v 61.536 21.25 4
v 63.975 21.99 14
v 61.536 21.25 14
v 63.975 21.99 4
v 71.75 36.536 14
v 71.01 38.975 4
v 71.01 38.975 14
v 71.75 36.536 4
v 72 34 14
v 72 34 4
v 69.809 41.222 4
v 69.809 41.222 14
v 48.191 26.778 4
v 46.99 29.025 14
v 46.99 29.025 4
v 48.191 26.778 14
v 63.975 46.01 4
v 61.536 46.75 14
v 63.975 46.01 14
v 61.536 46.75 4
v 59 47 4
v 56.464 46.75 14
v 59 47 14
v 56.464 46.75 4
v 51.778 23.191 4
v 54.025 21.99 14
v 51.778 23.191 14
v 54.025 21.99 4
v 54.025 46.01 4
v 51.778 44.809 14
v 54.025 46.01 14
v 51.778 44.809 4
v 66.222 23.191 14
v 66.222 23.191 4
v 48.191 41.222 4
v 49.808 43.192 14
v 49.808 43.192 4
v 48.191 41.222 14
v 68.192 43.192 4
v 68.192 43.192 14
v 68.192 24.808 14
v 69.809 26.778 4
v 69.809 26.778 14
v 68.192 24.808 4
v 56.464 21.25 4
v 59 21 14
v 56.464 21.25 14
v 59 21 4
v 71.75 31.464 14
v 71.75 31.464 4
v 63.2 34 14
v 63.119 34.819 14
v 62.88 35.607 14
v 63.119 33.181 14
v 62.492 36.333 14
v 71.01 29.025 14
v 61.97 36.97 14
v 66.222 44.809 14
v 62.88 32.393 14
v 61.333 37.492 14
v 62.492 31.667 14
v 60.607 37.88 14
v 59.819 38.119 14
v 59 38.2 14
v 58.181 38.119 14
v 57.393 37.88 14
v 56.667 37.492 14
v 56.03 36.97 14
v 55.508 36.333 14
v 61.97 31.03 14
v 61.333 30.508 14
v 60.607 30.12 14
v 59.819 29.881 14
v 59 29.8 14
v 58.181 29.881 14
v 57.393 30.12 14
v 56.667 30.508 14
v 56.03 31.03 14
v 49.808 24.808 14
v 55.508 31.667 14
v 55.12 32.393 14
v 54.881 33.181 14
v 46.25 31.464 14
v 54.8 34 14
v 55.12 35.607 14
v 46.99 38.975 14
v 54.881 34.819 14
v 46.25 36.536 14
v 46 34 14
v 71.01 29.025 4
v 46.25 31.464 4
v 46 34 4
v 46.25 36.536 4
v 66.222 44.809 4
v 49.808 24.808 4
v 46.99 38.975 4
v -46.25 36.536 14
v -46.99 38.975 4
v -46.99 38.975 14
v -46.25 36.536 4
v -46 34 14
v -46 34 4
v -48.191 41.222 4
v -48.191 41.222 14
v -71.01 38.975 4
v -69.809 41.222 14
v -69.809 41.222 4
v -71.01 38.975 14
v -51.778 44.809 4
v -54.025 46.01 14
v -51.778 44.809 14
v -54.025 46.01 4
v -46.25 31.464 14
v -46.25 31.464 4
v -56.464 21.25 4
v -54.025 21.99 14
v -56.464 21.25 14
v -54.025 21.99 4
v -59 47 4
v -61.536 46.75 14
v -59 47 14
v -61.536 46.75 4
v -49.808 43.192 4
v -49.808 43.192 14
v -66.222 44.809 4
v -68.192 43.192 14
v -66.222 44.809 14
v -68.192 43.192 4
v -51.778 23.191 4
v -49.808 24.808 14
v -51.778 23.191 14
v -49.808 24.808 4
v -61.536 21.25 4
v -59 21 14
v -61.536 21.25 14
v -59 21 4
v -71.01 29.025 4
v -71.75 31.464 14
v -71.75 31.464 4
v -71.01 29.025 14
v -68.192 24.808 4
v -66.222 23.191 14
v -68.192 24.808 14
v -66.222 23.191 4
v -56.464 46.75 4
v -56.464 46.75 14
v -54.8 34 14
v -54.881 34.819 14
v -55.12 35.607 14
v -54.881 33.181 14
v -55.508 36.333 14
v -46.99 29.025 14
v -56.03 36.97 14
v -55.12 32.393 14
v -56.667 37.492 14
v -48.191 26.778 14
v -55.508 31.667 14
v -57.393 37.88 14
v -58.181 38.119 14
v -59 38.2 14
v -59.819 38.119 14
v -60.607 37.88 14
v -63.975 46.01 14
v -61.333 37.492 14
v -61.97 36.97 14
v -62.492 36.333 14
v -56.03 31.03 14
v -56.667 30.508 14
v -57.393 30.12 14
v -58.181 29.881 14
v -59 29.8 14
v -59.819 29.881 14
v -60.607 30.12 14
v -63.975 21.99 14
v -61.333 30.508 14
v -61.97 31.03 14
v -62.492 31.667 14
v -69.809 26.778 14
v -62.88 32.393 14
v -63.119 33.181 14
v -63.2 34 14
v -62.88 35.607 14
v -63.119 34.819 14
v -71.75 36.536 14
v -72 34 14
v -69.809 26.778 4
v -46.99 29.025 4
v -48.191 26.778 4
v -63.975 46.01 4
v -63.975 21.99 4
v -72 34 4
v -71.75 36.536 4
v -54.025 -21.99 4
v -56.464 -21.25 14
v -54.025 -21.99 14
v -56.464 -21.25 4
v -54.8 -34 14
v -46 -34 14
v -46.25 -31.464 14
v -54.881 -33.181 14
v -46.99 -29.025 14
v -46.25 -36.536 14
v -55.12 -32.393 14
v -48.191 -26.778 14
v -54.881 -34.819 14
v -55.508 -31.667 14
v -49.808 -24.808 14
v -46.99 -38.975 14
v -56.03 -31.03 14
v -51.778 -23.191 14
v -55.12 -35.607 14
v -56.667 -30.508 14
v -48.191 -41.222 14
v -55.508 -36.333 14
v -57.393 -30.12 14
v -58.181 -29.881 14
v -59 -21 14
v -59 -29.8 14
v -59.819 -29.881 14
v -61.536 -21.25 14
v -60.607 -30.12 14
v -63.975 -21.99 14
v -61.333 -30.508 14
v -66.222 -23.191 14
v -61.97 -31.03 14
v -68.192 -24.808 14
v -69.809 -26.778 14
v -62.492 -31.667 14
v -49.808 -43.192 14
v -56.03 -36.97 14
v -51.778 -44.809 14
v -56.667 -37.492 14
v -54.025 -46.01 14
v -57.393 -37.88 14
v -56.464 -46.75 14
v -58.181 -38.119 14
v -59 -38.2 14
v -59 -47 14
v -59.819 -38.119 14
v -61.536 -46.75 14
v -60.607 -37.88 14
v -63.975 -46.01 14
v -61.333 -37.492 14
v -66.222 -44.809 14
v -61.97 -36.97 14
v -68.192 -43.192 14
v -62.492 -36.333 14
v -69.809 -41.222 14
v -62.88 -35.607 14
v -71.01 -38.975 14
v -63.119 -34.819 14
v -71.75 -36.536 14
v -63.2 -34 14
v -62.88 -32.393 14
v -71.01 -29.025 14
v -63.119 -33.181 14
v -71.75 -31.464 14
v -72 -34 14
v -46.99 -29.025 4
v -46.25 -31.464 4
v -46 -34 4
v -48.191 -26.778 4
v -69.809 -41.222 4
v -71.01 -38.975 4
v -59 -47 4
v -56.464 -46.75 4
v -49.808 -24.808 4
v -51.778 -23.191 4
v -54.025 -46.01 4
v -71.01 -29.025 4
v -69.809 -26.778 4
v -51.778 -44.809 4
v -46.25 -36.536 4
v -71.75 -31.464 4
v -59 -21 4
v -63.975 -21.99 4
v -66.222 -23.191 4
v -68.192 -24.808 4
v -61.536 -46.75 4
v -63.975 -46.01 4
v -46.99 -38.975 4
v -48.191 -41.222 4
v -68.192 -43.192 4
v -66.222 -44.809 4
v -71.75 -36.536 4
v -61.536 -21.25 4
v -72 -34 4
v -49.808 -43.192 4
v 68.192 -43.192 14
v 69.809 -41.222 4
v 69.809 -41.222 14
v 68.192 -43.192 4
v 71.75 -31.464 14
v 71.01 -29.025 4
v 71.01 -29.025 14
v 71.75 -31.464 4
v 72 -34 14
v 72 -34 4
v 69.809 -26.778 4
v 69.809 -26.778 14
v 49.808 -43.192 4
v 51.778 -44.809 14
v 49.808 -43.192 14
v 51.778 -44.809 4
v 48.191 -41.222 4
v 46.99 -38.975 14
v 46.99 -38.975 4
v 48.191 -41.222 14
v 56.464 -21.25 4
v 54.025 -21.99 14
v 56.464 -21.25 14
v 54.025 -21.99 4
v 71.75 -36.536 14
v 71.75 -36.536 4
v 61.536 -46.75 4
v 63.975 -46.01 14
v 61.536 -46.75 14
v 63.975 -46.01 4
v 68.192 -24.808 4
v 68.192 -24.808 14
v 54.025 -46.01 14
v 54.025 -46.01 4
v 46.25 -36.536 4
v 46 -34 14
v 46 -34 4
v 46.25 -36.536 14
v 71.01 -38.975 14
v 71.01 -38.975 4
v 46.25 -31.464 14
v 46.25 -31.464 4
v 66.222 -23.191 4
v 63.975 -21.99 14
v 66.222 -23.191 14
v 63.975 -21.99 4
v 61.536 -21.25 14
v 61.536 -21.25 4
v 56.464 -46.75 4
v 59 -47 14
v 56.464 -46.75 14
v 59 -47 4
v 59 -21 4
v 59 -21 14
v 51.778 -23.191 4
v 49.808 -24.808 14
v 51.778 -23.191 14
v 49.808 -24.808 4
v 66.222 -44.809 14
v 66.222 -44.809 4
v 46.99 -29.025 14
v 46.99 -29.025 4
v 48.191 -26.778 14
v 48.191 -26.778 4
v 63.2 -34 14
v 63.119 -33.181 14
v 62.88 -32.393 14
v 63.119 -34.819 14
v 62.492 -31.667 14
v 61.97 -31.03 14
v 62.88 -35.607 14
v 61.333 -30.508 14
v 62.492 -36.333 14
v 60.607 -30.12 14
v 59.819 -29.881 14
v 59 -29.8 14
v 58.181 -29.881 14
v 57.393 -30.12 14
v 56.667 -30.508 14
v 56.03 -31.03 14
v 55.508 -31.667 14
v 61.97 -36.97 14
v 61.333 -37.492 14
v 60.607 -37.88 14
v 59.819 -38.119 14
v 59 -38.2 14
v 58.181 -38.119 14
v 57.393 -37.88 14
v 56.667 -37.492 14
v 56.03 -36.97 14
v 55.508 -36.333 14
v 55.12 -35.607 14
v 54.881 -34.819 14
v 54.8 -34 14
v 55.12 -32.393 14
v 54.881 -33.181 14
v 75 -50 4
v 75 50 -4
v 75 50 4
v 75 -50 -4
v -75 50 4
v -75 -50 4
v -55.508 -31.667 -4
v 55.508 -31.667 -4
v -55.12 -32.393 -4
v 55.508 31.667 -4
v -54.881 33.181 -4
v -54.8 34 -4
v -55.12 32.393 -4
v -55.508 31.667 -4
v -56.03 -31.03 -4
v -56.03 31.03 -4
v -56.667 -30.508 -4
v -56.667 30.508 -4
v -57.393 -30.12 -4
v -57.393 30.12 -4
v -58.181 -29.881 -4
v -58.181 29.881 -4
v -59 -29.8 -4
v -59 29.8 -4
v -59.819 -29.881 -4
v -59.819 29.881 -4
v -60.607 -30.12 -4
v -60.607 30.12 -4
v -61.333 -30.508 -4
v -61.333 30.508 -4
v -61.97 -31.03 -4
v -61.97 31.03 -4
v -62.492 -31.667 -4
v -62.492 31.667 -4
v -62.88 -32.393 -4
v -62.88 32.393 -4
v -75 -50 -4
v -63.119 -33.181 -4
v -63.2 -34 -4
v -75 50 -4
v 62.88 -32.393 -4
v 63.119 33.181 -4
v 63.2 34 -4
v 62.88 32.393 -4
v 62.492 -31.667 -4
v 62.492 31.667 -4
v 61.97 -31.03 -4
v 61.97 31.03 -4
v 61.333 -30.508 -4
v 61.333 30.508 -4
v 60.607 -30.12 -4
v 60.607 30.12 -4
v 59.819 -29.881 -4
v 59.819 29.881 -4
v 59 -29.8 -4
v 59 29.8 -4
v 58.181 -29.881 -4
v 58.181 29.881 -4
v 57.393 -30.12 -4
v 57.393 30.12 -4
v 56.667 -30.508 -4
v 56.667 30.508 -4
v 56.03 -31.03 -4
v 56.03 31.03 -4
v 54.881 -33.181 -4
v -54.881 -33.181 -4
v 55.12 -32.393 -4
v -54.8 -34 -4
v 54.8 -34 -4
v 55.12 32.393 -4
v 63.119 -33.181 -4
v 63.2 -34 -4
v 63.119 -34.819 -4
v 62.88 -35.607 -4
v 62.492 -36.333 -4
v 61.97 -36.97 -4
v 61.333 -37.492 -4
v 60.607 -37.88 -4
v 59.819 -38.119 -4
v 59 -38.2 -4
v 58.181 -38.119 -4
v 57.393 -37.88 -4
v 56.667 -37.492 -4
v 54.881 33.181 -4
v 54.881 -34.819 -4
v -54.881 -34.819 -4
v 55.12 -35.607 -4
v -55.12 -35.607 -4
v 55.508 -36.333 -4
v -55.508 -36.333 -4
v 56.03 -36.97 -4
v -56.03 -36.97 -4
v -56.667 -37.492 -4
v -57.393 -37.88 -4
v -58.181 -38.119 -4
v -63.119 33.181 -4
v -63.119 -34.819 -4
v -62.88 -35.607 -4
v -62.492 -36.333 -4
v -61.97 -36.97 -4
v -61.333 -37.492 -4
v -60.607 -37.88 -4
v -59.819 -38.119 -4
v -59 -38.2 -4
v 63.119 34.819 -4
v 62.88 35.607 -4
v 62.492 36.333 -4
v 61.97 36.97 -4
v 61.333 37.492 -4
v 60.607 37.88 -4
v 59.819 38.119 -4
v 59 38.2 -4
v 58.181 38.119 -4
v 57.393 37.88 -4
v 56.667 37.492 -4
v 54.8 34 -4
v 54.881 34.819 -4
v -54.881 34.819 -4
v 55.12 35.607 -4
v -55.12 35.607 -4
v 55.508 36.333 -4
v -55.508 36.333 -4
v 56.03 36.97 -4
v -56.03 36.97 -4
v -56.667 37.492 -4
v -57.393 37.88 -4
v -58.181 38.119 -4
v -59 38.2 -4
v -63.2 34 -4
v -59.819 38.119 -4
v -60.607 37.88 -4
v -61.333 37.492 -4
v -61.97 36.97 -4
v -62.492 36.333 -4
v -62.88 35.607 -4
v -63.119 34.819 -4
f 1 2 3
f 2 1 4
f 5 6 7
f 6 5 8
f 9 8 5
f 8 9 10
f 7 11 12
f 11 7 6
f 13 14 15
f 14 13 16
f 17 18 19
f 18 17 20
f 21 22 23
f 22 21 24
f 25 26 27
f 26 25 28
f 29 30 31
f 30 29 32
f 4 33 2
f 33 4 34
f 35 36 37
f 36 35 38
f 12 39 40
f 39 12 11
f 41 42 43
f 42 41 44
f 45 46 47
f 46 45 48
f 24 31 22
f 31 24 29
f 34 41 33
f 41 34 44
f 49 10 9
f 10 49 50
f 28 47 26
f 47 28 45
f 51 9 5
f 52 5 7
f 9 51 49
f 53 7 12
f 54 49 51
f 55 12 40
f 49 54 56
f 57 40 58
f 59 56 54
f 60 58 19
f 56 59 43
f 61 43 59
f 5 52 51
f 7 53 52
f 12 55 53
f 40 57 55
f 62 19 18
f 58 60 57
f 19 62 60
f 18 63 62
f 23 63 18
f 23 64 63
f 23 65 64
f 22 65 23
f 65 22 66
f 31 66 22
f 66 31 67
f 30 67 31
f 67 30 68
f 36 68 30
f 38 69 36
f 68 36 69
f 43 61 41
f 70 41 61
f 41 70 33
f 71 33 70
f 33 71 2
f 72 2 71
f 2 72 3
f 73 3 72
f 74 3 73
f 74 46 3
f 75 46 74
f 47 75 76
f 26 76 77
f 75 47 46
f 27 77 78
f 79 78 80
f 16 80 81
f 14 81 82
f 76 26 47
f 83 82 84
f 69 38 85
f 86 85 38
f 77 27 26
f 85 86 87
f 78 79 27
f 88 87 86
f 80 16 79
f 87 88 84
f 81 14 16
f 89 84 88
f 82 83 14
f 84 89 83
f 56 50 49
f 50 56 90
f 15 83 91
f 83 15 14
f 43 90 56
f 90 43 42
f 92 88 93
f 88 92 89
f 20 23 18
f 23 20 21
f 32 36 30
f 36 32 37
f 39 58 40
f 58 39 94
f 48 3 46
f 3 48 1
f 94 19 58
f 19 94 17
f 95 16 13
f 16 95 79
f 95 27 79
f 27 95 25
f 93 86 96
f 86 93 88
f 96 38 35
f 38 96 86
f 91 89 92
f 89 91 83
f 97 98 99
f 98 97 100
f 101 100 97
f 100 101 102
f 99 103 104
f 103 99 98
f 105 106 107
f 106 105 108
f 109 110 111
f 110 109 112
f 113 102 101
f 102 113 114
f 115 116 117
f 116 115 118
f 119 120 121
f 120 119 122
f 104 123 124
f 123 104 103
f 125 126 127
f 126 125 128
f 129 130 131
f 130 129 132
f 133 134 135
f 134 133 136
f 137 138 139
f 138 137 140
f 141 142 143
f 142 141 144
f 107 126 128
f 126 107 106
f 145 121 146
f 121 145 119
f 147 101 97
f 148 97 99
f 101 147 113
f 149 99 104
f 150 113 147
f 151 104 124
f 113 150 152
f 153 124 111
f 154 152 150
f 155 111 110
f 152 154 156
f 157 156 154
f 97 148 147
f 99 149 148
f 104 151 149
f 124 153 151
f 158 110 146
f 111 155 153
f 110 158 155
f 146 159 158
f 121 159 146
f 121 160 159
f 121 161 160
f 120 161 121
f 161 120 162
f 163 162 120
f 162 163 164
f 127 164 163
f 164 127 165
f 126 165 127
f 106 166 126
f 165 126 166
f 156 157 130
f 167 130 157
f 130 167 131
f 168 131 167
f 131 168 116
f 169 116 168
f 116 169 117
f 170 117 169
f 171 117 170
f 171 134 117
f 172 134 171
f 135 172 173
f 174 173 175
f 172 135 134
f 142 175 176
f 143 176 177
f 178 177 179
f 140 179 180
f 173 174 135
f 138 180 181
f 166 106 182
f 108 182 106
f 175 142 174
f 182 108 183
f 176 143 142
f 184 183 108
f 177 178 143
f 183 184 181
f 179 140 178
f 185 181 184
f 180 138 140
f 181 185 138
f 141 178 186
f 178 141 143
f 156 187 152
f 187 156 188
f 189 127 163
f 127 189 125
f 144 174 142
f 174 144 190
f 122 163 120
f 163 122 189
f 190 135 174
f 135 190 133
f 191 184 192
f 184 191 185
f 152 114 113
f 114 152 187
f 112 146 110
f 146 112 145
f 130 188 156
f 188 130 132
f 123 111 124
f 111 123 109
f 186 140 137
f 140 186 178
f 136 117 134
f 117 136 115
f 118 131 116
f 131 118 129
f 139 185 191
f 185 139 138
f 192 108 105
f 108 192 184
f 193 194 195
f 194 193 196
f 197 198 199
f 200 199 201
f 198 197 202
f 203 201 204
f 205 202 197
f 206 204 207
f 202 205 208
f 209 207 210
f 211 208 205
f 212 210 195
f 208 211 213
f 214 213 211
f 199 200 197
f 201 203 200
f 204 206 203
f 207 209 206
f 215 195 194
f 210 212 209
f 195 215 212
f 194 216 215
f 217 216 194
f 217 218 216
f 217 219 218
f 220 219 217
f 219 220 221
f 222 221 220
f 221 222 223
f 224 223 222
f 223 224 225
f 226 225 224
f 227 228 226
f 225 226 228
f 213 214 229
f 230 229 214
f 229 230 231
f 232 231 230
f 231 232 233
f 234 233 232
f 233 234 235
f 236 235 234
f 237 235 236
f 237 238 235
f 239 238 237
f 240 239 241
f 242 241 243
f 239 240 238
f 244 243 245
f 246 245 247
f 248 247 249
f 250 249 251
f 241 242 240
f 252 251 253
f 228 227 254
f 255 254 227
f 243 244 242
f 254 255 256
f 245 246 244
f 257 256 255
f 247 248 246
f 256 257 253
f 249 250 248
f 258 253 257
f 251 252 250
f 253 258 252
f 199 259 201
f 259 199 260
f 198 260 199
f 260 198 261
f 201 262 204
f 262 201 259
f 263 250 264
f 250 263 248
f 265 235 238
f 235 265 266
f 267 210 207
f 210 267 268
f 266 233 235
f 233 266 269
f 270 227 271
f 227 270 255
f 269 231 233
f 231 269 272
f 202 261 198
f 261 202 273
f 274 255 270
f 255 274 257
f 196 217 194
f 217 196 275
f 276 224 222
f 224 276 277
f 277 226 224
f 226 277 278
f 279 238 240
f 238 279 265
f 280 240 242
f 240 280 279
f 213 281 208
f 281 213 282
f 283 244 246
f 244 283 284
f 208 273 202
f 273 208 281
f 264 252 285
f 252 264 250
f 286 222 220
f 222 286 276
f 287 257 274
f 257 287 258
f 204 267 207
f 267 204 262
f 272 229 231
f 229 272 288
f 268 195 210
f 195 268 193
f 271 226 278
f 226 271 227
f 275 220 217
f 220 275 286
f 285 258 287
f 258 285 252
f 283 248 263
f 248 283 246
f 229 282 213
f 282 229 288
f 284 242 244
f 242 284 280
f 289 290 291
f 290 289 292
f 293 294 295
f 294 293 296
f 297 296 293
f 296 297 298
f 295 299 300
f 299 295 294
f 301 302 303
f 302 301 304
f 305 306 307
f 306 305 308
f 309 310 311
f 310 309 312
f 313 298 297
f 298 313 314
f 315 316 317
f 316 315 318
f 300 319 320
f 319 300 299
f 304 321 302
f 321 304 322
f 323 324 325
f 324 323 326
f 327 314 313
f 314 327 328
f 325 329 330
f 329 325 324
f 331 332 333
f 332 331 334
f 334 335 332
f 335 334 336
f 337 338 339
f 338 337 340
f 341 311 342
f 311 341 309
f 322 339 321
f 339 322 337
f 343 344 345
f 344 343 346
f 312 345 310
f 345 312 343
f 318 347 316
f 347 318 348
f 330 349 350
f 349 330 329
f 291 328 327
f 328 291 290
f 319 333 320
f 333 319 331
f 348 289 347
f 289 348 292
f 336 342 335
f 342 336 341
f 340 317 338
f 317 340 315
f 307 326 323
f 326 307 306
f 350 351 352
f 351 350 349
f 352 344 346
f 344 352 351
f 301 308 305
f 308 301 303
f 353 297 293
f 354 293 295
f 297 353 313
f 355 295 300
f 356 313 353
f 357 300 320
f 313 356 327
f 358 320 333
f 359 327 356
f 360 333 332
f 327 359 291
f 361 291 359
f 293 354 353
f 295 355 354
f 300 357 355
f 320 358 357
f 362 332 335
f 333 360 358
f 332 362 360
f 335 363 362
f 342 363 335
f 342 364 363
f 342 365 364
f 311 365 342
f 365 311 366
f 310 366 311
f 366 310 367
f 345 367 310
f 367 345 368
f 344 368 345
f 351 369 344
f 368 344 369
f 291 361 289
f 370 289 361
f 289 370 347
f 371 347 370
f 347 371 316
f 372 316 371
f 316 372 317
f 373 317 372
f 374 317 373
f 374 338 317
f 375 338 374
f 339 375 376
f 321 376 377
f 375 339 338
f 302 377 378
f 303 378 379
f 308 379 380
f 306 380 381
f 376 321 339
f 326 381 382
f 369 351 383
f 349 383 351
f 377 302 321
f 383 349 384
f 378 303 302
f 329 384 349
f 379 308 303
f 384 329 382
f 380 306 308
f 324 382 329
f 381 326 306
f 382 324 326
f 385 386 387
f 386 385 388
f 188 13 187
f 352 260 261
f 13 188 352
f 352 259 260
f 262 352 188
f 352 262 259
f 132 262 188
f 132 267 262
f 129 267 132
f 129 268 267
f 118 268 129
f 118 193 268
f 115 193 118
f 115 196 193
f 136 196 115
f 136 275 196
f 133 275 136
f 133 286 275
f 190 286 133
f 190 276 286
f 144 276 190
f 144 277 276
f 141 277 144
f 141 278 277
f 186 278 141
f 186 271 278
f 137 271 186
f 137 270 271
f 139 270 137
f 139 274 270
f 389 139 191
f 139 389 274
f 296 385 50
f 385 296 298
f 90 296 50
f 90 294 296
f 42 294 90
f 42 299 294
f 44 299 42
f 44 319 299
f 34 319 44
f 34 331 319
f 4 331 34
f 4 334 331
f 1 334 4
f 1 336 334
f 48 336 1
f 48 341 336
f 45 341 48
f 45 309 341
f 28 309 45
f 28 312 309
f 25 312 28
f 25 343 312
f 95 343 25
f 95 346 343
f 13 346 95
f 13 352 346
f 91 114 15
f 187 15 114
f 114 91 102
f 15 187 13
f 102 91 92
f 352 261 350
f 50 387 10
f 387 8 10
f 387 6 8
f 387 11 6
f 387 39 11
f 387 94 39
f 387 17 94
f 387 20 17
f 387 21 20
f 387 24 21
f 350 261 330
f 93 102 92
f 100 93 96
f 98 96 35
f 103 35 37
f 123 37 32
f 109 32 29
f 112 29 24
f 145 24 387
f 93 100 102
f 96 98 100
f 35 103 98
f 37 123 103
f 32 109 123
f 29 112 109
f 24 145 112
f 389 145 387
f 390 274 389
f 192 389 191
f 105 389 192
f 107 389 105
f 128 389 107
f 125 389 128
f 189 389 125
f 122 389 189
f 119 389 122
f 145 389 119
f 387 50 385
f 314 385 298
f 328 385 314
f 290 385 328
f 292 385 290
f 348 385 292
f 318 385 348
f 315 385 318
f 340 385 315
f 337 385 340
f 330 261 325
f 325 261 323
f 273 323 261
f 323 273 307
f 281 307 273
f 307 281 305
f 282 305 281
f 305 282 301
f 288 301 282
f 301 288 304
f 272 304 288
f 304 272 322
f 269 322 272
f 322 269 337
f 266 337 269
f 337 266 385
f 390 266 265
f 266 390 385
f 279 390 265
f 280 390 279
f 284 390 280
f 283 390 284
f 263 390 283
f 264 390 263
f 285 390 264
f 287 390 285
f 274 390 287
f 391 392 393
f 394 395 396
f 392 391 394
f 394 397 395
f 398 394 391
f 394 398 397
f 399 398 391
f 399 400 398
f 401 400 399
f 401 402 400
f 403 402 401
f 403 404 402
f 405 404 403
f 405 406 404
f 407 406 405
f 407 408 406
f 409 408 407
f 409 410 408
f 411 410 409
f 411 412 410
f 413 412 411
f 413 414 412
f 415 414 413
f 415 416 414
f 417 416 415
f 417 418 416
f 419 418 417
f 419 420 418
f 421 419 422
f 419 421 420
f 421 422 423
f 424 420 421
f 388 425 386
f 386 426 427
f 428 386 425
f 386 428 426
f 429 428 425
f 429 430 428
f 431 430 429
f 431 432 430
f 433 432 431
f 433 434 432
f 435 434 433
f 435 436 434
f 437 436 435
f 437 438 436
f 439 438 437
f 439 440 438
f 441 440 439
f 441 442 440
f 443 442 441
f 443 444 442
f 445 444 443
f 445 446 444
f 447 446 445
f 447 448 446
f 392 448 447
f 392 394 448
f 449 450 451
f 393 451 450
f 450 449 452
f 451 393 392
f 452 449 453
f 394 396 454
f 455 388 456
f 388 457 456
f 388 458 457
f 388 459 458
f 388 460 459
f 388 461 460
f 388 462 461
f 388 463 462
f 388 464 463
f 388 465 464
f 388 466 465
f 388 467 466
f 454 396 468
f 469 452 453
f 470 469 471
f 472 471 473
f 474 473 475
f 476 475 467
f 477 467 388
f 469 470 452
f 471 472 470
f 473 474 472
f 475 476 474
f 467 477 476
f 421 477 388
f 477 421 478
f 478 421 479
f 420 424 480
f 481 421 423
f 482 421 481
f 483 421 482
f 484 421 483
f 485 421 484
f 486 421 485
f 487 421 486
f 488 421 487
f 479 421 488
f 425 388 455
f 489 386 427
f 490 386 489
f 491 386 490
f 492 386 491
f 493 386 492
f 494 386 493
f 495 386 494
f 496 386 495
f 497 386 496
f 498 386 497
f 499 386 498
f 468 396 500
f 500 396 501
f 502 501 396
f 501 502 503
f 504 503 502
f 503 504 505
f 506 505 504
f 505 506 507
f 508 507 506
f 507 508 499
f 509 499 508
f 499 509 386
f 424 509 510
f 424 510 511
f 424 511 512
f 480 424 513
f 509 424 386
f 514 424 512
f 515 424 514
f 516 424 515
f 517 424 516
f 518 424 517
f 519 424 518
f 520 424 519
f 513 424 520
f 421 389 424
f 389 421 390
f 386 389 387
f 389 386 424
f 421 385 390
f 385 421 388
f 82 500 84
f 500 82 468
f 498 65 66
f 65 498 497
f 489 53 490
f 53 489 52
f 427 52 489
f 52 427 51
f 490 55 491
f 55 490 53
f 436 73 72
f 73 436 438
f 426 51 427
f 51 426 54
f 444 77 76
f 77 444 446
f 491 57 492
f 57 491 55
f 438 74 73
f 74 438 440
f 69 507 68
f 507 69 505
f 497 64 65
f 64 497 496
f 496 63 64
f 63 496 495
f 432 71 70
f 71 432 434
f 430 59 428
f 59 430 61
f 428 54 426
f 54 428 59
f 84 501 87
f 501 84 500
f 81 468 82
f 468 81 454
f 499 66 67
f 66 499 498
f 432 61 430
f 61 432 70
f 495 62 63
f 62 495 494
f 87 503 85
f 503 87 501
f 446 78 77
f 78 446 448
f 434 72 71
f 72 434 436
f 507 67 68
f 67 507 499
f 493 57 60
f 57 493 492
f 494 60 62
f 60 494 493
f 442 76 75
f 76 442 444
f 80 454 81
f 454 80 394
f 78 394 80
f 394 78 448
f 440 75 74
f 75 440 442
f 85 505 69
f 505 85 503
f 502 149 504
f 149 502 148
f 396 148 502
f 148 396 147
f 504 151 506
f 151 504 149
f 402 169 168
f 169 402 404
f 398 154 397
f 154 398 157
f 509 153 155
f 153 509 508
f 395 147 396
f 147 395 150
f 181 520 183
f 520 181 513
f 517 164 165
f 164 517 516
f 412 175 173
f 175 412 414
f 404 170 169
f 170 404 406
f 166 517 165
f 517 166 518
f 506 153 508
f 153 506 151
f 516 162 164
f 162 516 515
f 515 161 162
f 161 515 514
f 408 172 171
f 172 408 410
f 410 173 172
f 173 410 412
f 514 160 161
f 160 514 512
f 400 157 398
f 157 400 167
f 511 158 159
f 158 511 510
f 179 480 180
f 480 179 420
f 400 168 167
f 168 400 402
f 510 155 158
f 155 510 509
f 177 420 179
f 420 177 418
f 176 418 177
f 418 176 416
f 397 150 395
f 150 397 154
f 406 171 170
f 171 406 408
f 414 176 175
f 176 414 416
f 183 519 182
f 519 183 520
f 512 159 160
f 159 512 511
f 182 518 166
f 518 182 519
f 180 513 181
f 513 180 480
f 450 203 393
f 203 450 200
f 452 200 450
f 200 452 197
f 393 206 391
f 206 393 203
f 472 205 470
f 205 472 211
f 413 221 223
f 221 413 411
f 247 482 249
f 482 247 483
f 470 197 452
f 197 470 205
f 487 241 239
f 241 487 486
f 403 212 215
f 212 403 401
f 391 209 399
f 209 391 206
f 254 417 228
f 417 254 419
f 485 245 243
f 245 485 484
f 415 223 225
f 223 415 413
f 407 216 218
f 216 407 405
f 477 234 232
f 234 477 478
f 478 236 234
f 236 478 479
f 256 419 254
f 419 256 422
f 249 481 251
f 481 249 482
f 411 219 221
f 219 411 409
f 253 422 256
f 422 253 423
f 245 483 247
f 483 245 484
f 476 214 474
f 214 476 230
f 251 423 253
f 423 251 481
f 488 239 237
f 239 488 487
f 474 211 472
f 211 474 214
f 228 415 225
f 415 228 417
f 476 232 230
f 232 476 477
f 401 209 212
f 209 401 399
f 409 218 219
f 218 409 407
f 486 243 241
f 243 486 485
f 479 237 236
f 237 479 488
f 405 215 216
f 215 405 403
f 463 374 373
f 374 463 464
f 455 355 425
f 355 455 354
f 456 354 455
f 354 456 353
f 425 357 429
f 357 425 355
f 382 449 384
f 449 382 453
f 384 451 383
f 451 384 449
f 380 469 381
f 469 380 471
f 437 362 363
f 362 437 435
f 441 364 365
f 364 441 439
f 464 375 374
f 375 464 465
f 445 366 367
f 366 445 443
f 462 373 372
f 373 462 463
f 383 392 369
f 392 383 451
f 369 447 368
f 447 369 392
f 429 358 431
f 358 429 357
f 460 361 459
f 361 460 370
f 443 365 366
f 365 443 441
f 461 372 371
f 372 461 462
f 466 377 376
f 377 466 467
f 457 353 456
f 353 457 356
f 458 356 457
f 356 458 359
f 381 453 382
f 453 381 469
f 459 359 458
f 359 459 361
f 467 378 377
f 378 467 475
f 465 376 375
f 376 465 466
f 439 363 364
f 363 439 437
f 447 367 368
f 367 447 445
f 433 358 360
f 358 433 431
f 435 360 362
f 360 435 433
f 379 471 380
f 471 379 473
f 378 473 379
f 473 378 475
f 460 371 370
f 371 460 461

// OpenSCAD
$fn = 32;

// ----------------------------------------------------------------------
// Anchor pads 150 x 100 x 18
// four corner bosses with anchor holes
// ----------------------------------------------------------------------

// --- parameters (mm) ---
plate = [150, 100, 8];  // base plate size (x, y, z)
pads = 4;               // boss count, one per corner
edge = 16;              // boss centre offset from the plate edge
boss_d = 26;            // boss diameter
boss_h = 10;            // boss height above the base plate
hole_d = 8.4;           // hole diameter

// --- derived feature positions (mm) ---
height = plate[2] + boss_h;      // = 18   overall height of the part
corner_x = plate[0] / 2 - edge;  // = 59   boss centre X
corner_y = plate[1] / 2 - edge;  // = 34   boss centre Y
feature_centers = [
  [corner_x, corner_y],
  [-corner_x, corner_y],
  [-corner_x, -corner_y],
  [corner_x, -corner_y]
];   // boss centres, anchor holes are drilled there

// base plate, four bosses standing on it, anchor holes all the way through
difference() {
  union() {
    cube(plate, center = true);
    for (centre = feature_centers)
      translate([centre[0], centre[1], plate[2] / 2 - 1])
        cylinder(d = boss_d, h = boss_h + 1);
  }
  for (centre = feature_centers)
    translate([centre[0], centre[1], -height])
      cylinder(d = hole_d, h = 2 * height + 2);  // through boss and plate
}
